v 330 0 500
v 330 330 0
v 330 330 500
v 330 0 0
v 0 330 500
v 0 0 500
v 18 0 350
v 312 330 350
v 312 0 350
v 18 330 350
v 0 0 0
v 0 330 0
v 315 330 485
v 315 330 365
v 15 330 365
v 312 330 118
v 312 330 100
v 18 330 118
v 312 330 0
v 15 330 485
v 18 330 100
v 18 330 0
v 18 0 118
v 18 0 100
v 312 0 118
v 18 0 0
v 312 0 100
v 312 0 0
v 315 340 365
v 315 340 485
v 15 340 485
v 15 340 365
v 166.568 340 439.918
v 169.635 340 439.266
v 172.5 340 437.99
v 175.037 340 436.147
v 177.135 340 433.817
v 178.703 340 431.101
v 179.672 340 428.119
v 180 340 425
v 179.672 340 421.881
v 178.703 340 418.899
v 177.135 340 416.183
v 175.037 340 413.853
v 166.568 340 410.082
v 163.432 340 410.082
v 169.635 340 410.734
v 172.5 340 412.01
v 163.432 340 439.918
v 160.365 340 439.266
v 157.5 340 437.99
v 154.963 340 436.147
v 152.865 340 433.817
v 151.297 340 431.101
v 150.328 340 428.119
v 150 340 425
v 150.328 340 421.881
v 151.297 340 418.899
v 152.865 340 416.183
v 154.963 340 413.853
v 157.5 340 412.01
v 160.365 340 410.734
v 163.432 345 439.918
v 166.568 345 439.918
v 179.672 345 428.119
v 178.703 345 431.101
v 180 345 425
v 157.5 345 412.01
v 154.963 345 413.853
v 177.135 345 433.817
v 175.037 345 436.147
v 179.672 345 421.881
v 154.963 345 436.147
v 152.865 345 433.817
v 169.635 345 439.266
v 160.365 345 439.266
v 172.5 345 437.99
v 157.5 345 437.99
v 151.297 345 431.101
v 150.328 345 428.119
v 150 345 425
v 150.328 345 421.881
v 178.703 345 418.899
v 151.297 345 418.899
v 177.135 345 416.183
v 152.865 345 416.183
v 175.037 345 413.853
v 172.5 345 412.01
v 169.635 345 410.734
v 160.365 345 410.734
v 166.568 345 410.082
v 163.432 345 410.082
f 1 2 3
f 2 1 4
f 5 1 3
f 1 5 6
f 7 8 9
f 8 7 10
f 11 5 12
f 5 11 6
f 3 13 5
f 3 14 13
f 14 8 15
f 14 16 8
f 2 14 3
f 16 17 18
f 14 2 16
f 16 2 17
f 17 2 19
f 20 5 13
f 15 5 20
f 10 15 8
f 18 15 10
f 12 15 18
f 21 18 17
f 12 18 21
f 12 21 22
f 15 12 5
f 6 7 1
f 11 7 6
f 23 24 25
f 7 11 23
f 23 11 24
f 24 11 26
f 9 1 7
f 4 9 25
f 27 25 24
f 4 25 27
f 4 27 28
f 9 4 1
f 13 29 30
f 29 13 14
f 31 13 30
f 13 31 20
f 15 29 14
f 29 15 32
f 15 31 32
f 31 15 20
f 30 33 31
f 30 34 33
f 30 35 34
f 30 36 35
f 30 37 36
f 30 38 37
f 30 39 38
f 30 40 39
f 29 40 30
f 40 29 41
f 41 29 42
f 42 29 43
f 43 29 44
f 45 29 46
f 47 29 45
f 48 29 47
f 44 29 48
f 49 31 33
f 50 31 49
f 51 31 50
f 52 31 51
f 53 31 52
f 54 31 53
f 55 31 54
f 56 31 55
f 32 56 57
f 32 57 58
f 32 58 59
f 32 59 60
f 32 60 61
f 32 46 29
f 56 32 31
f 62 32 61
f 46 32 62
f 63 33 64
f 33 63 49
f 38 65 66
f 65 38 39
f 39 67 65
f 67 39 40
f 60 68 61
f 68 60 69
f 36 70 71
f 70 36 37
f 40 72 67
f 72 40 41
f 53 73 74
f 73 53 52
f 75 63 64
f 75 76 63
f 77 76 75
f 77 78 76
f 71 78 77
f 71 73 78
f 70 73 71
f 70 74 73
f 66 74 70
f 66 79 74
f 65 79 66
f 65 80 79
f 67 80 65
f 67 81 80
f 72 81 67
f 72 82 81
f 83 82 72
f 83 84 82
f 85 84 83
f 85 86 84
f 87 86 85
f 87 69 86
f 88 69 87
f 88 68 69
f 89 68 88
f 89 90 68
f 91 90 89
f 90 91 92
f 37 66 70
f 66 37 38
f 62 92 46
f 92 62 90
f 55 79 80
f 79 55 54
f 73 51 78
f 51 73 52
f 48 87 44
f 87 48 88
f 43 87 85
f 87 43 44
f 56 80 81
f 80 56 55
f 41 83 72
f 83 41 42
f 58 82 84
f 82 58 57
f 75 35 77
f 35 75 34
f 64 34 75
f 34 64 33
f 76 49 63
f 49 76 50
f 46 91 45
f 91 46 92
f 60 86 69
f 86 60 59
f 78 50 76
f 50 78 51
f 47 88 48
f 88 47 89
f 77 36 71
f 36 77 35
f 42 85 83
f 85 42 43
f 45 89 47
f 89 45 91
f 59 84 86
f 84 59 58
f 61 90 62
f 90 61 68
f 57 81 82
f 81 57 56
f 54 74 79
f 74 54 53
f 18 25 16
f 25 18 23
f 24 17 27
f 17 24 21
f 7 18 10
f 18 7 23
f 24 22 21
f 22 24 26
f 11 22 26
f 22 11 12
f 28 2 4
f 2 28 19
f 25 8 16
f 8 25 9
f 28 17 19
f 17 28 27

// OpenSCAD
w=330; //mm
d=330;
t=150; //thickness

h=500; //height

leg_t = 18; //leg thickness


module leg(x,y) {
    translate([x,y,0]){
        //cube(size = [leg_t,leg_t,h-t], center = false); //thin legs
        cube(size = [leg_t,d,h-t], center = false); //side wals
    }
}


//Top shelf with empty drawer
/*
translate([0,0,h-t]){
    difference(){
        cube(size = [w,d,t], center = false);
        translate([15,15,15]){
            cube(size = [w-30,d+30,t-30], center = false); //Inner shelf
        }
    }
}
*/

//Top shelf with drawer
translate([0,0,h-t]){
    cube(size = [w,d,t], center = false);
    translate([15,d-20,15]){ color("SaddleBrown", 0.8){
        cube(size = [w-30,30,t-30], center = false); //Drawer front
        }}
}


//Drawer fob
fob_w=15;
translate([w/2,d+15, h-(t/2)]) { rotate([90,0,0]){ color("DarkGoldenrod", 1.0) {
    cylinder(h=20, r1 = fob_w, r2 = fob_w, center = false);
}}}

//Under shelf
translate([0,0,100]){
    cube(size = [w,d,leg_t], center = false);
}



leg(0, 0);
//leg(0, d-leg_t);
leg(w-leg_t, 0);
//leg(w-leg_t, d-leg_t);
